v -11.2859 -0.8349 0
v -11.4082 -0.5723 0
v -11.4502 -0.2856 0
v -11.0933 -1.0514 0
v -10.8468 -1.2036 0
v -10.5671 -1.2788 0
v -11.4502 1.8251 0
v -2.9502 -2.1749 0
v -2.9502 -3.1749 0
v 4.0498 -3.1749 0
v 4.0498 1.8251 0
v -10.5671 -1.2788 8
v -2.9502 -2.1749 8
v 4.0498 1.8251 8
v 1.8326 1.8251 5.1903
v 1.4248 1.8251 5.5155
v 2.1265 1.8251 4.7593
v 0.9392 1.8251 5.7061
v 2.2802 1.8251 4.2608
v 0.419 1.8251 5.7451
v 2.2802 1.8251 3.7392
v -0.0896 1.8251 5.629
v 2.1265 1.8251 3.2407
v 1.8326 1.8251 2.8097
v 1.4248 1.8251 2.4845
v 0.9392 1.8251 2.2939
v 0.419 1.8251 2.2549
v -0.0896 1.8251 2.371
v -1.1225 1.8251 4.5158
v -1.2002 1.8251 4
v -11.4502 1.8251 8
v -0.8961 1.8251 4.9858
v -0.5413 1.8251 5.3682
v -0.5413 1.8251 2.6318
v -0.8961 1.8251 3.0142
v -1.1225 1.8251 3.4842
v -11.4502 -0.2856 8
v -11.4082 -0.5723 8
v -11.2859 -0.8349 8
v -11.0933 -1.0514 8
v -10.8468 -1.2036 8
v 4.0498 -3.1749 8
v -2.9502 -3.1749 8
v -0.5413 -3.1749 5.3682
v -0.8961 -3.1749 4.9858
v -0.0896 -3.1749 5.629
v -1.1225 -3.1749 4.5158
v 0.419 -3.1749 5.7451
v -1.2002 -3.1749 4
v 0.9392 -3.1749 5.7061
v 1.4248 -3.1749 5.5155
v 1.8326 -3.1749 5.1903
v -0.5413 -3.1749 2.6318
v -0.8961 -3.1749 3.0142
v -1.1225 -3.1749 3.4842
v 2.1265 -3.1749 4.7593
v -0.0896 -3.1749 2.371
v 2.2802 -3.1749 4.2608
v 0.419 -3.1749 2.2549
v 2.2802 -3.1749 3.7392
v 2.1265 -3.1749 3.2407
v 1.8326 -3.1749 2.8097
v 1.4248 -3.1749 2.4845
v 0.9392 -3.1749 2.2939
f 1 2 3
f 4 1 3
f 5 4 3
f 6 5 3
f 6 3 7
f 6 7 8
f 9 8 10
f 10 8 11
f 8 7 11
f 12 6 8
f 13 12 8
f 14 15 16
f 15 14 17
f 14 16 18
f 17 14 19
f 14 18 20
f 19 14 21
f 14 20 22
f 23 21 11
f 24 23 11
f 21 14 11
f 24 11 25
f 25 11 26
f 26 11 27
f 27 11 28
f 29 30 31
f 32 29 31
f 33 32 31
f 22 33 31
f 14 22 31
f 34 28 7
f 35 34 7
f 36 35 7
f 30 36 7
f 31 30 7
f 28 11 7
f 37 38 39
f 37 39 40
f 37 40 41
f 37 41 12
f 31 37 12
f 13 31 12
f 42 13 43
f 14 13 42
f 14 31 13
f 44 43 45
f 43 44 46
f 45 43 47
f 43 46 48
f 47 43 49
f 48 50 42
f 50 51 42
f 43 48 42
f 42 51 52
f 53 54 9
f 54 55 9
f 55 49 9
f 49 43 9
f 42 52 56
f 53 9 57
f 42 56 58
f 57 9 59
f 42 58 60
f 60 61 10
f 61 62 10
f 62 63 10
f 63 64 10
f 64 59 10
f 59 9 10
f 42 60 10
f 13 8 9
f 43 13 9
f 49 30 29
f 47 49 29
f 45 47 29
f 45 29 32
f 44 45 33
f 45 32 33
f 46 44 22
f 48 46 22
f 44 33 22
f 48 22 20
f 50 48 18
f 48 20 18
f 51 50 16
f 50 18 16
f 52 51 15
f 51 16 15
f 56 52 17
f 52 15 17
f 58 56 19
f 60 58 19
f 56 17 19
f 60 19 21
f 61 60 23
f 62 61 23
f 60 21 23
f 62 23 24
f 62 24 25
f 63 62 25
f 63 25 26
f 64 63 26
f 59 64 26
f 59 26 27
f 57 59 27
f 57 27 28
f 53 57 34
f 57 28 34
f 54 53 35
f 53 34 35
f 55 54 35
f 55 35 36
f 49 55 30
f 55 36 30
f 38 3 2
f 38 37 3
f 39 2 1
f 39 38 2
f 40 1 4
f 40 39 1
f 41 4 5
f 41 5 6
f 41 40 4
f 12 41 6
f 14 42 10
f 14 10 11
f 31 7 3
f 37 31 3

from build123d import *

# Parameters (mm, degrees)
F1_DEPTH = 8
F2_R     = 1.75
F3_DEPTH = 5
F4_R     = 1


with BuildPart() as f1:
    # F0 (on Top) → F1 (new body)
    with BuildSketch(Plane.XY):
        Polygon((4.049788, -3.174863), (4.049788, 1.825137), (-11.450212, 1.825137), (-11.450212, -1.174863), (-2.950212, -2.174863), (-2.950212, -3.174863), align=None)
    extrude(amount=F1_DEPTH)

    # F2 (on face) → F3 (cut, through all)
    with BuildSketch(Plane(origin=(0, 1.825137, 0), x_dir=(-1, 0, 0), z_dir=(0, 1, 0))):
        with Locations((-0.549788, 4)):
            Circle(F2_R)
    extrude(amount=-F3_DEPTH, mode=Mode.SUBTRACT)

    # F4
    f4_edges = [f1.edges().sort_by_distance(p)[0] for p in [
        (-11.450212, -1.174863, 4),
    ]]
    fillet(f4_edges, radius=F4_R)


solid = f1.part
